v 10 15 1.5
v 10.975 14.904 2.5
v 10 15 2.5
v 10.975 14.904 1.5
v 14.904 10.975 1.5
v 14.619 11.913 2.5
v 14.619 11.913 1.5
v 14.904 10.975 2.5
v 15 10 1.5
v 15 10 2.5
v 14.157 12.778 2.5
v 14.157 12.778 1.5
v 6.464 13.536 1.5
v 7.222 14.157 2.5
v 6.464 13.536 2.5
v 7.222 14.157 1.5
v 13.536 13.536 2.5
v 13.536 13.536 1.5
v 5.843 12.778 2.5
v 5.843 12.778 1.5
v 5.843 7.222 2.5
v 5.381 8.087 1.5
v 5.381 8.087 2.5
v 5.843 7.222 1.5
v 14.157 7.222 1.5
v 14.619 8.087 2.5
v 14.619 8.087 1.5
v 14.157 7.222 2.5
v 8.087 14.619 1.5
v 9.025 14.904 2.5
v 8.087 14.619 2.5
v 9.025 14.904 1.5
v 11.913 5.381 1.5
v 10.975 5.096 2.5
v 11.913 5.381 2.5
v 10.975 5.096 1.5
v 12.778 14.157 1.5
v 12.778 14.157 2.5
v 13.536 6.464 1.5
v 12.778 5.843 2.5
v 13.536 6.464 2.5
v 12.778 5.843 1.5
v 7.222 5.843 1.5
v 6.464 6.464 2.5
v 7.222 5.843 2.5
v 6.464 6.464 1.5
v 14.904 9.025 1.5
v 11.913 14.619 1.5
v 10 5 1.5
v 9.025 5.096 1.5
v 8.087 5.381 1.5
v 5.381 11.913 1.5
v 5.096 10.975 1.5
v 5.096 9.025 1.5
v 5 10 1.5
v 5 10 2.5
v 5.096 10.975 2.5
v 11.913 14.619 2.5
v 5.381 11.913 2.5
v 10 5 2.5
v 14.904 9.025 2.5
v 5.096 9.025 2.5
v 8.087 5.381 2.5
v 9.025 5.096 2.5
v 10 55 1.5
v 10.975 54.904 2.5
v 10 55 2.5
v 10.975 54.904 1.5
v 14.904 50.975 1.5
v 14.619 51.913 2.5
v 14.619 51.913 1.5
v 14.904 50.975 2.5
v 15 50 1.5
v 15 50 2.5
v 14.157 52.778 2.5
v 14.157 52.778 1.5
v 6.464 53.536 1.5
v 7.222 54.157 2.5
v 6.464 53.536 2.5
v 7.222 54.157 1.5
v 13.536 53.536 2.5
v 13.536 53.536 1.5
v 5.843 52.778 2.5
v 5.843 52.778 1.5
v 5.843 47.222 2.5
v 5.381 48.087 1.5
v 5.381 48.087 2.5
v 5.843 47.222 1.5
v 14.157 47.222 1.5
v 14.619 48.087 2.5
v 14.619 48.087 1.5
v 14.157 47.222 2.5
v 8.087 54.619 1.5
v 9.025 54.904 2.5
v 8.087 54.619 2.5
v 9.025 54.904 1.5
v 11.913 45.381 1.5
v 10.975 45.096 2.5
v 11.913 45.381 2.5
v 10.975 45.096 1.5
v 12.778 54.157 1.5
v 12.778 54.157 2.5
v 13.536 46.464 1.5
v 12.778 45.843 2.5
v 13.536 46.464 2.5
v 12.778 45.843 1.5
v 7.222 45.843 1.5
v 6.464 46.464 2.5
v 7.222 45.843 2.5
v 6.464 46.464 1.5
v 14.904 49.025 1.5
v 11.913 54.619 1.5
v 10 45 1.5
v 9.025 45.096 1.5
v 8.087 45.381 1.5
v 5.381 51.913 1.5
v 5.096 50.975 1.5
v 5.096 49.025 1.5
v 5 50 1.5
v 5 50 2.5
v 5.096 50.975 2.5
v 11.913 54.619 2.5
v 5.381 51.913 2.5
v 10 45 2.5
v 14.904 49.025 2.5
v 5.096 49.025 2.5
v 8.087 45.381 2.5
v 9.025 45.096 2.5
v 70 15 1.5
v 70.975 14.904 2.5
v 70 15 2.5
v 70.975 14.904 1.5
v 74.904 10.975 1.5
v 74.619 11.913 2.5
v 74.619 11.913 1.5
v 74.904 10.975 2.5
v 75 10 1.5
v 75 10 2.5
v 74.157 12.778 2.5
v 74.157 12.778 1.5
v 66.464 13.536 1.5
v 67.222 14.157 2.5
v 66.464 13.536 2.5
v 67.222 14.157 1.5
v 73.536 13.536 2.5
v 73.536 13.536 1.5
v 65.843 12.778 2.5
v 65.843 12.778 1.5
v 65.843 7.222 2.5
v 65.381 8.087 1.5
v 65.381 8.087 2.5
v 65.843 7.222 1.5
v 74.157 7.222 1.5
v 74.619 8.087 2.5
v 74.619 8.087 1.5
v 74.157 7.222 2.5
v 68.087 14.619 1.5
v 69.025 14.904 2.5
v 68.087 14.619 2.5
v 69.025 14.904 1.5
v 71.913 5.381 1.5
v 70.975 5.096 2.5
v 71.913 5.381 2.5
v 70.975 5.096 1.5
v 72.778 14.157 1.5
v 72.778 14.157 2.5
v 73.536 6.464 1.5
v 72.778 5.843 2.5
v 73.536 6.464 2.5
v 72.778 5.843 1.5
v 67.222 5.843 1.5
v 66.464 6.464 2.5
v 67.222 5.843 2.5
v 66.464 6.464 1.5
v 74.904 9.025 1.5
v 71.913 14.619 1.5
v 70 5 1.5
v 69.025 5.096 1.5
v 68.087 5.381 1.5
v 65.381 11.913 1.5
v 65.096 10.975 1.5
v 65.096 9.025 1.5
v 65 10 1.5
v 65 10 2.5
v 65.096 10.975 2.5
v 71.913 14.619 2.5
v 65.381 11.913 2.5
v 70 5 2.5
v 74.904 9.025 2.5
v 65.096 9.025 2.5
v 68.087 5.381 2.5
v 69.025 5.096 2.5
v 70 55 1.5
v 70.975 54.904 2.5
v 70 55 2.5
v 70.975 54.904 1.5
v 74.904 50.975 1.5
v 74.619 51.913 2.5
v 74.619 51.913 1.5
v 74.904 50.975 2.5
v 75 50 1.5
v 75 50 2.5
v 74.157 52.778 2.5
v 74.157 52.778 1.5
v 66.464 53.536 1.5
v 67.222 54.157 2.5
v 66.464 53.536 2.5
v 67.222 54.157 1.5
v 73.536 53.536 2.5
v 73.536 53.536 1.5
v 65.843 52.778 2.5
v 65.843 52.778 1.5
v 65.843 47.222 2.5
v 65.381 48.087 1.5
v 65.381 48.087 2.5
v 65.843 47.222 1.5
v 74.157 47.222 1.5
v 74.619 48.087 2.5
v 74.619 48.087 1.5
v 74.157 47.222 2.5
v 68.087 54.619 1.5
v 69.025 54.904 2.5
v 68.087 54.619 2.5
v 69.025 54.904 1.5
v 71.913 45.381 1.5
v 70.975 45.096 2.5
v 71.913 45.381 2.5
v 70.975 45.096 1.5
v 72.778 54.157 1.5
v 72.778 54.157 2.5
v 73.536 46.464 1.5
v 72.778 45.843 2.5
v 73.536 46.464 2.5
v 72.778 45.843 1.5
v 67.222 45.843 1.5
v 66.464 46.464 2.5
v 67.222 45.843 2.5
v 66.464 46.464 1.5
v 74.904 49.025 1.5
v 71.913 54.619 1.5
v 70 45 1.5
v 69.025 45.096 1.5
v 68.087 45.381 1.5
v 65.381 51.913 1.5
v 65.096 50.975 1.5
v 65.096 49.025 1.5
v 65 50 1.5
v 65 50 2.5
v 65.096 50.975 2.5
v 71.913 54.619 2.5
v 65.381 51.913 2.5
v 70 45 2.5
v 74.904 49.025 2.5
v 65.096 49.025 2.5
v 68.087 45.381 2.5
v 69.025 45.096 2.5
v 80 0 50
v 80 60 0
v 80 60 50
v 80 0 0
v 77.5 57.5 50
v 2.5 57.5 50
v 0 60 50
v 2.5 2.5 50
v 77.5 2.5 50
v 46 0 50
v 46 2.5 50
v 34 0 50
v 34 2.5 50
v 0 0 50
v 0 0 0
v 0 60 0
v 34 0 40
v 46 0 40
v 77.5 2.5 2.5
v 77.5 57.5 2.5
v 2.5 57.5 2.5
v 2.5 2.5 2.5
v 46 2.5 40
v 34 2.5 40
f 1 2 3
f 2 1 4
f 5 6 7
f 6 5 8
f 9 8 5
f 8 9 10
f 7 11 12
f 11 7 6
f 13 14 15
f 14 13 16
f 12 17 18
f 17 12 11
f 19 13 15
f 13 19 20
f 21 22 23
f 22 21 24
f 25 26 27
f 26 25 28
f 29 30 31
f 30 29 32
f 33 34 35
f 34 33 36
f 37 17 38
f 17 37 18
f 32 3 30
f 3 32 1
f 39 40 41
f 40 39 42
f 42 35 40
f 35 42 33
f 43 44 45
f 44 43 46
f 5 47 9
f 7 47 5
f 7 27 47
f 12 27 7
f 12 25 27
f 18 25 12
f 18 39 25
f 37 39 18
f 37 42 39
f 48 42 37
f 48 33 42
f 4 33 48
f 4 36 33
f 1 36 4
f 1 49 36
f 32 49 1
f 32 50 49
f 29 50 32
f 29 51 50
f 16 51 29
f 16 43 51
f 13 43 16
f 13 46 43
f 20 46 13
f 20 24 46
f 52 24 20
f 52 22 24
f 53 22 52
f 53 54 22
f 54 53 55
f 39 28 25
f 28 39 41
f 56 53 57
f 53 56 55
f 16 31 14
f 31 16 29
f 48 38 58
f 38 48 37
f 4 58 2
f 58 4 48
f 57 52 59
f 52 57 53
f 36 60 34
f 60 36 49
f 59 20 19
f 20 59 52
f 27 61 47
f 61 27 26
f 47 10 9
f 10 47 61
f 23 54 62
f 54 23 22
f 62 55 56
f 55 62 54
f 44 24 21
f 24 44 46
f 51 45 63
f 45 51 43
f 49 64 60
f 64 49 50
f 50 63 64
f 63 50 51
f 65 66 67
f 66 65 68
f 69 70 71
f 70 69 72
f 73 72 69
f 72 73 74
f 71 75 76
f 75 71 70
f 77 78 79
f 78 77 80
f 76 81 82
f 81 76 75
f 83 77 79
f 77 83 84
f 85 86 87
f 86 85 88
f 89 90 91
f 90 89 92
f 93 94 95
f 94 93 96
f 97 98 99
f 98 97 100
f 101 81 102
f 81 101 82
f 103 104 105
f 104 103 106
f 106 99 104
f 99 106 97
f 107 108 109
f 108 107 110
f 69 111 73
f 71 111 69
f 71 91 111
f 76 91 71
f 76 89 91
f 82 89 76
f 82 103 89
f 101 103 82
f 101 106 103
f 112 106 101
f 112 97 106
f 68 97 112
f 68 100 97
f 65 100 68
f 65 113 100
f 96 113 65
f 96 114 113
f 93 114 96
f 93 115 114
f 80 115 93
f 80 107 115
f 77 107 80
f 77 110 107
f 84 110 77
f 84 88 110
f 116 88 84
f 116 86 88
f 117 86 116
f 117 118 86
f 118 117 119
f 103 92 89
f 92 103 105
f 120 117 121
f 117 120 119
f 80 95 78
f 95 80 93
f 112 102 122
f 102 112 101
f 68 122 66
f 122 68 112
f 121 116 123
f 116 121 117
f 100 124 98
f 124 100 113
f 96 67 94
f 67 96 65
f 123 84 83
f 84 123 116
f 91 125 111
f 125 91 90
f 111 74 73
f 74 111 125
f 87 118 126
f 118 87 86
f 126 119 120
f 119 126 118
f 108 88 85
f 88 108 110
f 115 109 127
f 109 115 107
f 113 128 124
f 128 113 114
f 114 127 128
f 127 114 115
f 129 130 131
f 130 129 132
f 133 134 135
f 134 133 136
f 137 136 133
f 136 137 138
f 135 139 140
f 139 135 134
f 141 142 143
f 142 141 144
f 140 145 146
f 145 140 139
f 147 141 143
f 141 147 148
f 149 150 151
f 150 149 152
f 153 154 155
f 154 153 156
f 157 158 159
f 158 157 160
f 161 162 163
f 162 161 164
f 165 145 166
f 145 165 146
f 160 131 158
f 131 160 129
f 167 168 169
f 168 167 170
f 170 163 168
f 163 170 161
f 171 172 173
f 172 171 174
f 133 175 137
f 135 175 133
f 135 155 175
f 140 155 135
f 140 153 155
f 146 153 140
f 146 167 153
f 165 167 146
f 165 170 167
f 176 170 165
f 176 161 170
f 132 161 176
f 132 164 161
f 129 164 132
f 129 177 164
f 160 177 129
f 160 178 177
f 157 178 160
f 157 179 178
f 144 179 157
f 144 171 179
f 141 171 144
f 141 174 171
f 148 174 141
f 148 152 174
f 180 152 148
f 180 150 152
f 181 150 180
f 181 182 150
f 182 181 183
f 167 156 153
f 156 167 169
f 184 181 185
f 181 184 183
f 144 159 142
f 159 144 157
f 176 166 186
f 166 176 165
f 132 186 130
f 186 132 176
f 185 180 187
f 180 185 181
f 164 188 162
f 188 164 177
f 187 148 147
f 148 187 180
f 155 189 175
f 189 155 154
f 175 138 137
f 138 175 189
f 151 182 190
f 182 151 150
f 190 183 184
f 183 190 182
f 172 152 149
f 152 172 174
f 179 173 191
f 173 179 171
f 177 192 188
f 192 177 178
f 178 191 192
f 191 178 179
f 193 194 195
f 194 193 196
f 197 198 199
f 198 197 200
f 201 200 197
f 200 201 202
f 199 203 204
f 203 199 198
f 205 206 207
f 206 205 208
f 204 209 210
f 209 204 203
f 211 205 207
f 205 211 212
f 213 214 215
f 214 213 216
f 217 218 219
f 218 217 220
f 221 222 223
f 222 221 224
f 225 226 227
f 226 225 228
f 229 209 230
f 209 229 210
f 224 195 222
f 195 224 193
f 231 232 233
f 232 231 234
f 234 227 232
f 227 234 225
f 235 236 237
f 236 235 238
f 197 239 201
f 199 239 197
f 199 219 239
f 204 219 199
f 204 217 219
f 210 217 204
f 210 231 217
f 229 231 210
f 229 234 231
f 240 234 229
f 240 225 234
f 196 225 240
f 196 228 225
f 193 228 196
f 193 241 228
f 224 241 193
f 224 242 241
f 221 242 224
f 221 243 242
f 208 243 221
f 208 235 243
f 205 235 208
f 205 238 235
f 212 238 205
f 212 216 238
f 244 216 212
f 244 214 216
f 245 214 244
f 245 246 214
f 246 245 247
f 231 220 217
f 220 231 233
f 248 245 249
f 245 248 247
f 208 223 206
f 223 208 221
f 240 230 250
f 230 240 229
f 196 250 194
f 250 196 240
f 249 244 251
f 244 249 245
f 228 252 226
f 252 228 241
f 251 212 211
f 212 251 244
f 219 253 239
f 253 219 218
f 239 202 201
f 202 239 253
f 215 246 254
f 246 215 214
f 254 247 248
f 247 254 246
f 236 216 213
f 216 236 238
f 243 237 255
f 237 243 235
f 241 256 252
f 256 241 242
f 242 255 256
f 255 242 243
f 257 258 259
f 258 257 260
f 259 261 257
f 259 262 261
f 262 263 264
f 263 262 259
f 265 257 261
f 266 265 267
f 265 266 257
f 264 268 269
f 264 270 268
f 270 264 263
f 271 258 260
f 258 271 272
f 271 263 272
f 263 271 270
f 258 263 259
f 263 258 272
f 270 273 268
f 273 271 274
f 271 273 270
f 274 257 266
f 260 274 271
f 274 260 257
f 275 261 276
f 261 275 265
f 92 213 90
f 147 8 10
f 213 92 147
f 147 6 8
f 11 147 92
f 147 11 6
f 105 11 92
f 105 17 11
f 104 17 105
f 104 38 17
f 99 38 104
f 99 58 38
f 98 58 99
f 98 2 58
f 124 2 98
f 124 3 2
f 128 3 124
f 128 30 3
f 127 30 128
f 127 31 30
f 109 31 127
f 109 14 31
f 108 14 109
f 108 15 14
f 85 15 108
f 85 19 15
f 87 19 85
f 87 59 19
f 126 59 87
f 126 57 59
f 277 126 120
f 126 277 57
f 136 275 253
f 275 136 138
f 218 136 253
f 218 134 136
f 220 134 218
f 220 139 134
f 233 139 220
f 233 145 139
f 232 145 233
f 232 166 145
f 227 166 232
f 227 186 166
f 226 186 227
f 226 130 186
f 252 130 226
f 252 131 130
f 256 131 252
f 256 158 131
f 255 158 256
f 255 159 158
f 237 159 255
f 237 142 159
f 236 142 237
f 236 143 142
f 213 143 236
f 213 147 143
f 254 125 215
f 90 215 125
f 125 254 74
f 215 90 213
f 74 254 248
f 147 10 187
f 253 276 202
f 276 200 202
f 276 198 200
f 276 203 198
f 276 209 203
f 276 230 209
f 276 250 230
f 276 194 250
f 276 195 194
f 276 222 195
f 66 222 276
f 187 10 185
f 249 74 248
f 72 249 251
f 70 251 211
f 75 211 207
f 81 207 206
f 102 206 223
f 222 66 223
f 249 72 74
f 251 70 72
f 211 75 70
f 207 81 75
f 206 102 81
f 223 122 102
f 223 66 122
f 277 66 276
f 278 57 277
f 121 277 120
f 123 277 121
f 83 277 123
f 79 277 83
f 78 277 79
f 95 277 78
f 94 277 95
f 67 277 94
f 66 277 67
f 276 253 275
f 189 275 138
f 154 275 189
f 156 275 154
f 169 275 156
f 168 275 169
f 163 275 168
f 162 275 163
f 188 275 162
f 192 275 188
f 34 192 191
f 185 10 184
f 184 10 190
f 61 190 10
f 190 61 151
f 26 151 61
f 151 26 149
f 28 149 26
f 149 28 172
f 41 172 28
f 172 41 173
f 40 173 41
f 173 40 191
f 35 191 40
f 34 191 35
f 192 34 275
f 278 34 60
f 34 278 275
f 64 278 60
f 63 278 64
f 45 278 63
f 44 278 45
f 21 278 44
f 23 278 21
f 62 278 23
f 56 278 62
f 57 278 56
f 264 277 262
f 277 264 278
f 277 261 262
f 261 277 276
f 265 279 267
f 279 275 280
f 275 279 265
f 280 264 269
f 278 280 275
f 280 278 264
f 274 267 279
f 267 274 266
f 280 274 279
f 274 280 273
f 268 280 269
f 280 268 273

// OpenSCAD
$fn = 32;

// ----------------------------------------------------------------------
// Enclosure box: both enclosure
// ----------------------------------------------------------------------

// --- parameters (mm) ---
box_l = 80;               // outer length, X
box_w = 60;               // outer width, Y
box_h = 50;               // outer height
wall_t = 2.5;             // wall thickness
boss_r = 5;               // corner boss radius
hole_r = 2;               // boss screw hole radius
boss_in = 10;             // boss inset from the corners
notch_w = 12;             // cable notch width
notch_h = 10;             // cable notch height

inner_h = box_h - wall_t;  // cavity depth
boss_h = inner_h - 2;  // corner boss height

difference() {
  cube([box_l, box_w, box_h]);
  translate([wall_t, wall_t, wall_t])
    cube([box_l - 2 * wall_t, box_w - 2 * wall_t, box_h]);
  for (sx = [0, 1], sy = [0, 1])
    translate([sx ? box_l - boss_in : boss_in,
               sy ? box_w - boss_in : boss_in, wall_t - 1]) {
      cylinder(r = boss_r, h = boss_h);
      translate([0, 0, boss_h - 4])
        cylinder(r = hole_r, h = 5);
    }
  translate([box_l / 2 - notch_w / 2, -1, box_h - notch_h])
    cube([notch_w, wall_t + 2, notch_h + 1]);
}
